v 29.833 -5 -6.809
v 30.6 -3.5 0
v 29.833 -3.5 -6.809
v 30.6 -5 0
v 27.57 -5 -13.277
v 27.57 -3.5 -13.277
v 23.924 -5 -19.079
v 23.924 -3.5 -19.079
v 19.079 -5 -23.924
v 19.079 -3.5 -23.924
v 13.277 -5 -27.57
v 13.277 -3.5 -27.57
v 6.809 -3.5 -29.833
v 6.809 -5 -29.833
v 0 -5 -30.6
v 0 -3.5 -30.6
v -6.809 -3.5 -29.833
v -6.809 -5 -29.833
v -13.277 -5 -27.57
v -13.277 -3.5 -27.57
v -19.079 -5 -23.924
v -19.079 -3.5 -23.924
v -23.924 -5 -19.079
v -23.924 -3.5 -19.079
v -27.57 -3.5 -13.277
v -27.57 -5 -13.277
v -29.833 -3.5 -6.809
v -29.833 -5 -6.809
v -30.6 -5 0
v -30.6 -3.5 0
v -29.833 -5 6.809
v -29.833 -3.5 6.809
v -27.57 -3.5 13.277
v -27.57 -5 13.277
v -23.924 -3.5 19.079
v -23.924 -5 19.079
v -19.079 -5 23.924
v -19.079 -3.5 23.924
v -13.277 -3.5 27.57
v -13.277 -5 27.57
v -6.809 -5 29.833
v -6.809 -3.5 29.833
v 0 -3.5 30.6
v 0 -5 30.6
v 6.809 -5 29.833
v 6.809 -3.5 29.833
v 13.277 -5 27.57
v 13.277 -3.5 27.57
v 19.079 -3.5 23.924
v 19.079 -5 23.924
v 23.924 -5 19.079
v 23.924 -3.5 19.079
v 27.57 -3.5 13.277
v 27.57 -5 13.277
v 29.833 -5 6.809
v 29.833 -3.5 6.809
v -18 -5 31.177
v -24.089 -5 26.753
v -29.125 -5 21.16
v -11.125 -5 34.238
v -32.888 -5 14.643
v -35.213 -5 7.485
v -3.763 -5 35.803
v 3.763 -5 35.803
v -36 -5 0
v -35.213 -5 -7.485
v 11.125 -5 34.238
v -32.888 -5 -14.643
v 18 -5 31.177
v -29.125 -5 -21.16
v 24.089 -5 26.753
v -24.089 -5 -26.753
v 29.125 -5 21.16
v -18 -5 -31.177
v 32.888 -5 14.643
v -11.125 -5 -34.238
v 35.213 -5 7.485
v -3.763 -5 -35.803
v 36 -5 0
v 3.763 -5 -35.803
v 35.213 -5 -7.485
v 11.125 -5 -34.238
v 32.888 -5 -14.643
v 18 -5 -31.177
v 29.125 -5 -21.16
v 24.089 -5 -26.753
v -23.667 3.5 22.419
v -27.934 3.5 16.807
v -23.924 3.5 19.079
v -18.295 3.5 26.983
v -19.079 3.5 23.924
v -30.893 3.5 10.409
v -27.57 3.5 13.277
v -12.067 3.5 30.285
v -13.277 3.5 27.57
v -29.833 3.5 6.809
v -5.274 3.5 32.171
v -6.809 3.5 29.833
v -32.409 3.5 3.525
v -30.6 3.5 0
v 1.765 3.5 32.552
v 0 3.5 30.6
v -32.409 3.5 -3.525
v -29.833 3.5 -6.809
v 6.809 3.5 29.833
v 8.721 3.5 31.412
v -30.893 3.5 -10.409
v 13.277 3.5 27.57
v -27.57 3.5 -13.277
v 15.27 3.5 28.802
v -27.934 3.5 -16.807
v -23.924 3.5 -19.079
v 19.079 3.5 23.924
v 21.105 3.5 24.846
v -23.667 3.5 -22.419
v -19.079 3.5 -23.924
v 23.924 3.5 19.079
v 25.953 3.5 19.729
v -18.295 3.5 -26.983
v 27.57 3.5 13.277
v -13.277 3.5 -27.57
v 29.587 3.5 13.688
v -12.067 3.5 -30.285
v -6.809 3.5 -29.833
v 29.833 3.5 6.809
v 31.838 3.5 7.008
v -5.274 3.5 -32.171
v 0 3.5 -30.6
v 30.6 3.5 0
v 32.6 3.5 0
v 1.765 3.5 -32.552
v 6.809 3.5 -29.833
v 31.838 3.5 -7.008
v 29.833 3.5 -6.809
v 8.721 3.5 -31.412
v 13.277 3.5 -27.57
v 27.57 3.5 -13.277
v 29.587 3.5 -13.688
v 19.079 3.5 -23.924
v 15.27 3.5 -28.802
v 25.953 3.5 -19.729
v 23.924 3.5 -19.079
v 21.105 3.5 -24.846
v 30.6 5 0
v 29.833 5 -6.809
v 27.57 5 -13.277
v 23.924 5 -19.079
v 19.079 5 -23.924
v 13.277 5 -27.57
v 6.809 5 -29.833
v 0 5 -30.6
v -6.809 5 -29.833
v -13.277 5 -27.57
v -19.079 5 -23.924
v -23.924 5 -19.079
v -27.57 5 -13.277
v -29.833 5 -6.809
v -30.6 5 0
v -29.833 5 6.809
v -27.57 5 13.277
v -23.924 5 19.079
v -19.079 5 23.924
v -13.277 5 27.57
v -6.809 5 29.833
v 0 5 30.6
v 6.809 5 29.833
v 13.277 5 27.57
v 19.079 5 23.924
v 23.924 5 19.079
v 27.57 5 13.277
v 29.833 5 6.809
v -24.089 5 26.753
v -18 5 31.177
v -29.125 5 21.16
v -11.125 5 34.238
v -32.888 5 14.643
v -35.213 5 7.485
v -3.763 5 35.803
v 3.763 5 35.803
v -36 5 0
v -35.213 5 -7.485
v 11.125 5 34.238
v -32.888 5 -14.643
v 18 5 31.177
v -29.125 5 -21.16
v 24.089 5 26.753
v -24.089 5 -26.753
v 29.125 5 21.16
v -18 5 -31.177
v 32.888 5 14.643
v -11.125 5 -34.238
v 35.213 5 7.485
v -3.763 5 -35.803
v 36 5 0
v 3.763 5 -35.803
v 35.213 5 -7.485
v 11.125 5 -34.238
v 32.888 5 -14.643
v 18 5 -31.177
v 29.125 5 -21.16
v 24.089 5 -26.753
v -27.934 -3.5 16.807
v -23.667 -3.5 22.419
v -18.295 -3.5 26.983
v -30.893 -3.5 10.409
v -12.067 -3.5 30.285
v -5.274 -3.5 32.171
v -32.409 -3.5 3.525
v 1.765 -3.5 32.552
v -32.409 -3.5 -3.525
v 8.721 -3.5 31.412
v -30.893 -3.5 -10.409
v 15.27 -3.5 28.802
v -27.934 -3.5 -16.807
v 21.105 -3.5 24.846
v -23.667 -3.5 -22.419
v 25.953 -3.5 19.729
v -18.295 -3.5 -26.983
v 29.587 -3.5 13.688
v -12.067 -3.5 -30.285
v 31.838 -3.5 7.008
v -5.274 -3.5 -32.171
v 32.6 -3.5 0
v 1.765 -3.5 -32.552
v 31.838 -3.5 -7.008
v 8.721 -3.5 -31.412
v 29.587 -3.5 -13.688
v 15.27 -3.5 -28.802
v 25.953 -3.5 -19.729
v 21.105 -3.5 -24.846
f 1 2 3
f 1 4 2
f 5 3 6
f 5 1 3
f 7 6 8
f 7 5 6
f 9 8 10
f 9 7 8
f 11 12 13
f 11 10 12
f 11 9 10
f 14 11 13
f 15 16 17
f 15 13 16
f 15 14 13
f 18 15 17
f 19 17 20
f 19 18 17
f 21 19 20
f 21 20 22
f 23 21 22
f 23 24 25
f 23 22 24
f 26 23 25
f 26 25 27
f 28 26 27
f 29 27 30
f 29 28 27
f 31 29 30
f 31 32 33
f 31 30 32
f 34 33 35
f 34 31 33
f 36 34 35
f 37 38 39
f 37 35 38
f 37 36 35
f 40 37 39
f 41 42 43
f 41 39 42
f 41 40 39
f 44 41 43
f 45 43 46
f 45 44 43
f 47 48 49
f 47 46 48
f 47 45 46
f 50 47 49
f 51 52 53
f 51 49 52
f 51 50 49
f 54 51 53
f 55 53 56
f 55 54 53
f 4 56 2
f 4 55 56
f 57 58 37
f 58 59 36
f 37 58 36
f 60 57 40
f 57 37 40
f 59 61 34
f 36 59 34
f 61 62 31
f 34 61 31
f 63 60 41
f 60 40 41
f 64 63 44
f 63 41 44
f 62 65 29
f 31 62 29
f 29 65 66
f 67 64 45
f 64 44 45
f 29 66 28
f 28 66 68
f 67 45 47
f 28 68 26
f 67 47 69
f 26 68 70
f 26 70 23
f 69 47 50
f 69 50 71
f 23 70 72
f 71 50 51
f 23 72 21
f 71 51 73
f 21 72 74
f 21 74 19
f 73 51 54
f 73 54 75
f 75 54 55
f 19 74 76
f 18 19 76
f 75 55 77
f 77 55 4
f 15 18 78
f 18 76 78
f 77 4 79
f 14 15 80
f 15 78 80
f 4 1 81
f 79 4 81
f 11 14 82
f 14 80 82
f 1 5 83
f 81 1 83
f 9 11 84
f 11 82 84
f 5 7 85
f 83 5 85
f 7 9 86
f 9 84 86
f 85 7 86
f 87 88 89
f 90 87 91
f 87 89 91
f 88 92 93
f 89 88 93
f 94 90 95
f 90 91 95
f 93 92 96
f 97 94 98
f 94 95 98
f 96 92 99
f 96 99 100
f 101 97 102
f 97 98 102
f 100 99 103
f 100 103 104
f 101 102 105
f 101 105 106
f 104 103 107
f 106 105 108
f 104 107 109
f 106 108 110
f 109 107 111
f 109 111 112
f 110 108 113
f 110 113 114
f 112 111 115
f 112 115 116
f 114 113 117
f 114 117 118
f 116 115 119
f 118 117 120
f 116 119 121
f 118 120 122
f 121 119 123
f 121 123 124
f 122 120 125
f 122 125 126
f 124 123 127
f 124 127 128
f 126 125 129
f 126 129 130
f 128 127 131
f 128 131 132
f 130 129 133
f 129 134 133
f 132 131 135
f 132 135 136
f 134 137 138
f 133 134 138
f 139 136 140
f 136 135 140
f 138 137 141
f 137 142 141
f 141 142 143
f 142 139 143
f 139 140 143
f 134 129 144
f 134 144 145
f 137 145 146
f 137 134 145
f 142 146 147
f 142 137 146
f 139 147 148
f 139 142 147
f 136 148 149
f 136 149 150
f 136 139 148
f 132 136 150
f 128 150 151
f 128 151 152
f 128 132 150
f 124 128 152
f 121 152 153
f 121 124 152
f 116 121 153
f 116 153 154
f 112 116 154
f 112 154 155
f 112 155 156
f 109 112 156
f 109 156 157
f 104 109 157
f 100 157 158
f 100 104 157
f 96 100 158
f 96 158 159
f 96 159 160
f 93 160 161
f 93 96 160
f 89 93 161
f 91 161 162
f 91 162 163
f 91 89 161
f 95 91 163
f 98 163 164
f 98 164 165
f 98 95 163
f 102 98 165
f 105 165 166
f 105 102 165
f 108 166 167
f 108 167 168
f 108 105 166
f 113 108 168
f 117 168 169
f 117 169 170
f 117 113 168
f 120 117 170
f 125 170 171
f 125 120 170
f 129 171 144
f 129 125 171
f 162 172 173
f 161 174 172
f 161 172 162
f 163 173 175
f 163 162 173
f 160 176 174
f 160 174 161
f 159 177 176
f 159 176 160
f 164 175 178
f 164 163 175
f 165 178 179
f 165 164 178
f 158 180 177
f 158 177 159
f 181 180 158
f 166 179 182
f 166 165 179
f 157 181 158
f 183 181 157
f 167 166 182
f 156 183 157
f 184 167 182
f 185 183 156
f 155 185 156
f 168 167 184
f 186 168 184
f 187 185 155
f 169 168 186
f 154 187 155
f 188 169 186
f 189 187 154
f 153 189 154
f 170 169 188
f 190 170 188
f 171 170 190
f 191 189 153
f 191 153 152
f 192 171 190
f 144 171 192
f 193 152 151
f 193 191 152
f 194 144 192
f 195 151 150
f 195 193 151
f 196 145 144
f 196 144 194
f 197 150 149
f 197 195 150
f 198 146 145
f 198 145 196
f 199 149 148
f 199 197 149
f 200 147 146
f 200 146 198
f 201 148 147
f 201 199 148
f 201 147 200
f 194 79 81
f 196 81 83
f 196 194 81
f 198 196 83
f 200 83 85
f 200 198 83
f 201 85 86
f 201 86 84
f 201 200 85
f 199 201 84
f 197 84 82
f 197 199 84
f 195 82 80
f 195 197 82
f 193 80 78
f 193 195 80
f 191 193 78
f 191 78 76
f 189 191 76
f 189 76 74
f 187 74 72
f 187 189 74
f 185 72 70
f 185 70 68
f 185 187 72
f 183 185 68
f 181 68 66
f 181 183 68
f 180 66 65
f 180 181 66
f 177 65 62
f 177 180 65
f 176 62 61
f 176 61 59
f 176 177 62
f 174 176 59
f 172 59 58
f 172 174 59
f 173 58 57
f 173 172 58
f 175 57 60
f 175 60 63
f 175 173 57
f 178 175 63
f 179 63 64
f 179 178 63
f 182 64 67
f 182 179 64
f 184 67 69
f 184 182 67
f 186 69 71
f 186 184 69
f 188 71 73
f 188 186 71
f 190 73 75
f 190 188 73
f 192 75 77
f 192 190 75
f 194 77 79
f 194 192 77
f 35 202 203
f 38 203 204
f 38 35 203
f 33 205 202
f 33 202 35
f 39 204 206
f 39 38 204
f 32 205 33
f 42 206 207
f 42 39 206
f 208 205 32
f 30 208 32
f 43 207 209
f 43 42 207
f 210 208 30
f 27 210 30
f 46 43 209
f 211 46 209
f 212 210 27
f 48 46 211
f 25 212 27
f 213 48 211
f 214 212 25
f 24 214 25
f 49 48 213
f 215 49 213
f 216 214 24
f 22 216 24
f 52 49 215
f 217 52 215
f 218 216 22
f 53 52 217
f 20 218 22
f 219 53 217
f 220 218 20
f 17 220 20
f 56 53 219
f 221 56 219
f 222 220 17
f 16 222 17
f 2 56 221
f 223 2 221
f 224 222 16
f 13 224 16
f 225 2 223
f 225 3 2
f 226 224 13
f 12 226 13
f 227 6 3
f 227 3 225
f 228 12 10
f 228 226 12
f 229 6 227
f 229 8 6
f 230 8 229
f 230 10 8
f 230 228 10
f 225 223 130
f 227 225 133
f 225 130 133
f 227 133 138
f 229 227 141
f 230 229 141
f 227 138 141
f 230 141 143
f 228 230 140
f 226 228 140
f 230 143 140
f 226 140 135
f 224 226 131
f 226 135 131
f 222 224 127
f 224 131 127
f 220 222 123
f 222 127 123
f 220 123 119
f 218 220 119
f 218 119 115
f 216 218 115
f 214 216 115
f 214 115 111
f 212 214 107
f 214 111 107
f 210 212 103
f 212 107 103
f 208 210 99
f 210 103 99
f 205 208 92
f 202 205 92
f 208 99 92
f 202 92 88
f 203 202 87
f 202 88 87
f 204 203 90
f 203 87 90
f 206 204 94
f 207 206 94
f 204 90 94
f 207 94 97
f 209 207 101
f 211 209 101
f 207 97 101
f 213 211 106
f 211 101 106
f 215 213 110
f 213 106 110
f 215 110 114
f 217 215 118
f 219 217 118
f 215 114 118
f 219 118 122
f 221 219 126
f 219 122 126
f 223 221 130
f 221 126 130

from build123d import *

# Parameters (mm, degrees)
SKETCH1_R           = 36
SKETCH1_R_2         = 30.6
BOSS_EXTRUDE1_DEPTH = 5
SKETCH2_R           = 32.6
CUT_EXTRUDE1_DEPTH  = 3.5


with BuildPart() as part:
    # Sketch1 → Boss-Extrude1 (new body, symmetric)
    with BuildSketch(Plane(origin=(0, 0, 0), x_dir=(1, 0, 0), z_dir=(0, 1, 0))):
        Circle(SKETCH1_R)
        Circle(SKETCH1_R_2, mode=Mode.SUBTRACT)
    extrude(amount=BOSS_EXTRUDE1_DEPTH, both=True)

    # Sketch2 → Cut-Extrude1 (cut, symmetric)
    with BuildSketch(Plane(origin=(0, 0, 0), x_dir=(1, 0, 0), z_dir=(0, 1, 0))):
        Circle(SKETCH2_R)
    extrude(amount=CUT_EXTRUDE1_DEPTH, both=True, mode=Mode.SUBTRACT)


solid = part.part
